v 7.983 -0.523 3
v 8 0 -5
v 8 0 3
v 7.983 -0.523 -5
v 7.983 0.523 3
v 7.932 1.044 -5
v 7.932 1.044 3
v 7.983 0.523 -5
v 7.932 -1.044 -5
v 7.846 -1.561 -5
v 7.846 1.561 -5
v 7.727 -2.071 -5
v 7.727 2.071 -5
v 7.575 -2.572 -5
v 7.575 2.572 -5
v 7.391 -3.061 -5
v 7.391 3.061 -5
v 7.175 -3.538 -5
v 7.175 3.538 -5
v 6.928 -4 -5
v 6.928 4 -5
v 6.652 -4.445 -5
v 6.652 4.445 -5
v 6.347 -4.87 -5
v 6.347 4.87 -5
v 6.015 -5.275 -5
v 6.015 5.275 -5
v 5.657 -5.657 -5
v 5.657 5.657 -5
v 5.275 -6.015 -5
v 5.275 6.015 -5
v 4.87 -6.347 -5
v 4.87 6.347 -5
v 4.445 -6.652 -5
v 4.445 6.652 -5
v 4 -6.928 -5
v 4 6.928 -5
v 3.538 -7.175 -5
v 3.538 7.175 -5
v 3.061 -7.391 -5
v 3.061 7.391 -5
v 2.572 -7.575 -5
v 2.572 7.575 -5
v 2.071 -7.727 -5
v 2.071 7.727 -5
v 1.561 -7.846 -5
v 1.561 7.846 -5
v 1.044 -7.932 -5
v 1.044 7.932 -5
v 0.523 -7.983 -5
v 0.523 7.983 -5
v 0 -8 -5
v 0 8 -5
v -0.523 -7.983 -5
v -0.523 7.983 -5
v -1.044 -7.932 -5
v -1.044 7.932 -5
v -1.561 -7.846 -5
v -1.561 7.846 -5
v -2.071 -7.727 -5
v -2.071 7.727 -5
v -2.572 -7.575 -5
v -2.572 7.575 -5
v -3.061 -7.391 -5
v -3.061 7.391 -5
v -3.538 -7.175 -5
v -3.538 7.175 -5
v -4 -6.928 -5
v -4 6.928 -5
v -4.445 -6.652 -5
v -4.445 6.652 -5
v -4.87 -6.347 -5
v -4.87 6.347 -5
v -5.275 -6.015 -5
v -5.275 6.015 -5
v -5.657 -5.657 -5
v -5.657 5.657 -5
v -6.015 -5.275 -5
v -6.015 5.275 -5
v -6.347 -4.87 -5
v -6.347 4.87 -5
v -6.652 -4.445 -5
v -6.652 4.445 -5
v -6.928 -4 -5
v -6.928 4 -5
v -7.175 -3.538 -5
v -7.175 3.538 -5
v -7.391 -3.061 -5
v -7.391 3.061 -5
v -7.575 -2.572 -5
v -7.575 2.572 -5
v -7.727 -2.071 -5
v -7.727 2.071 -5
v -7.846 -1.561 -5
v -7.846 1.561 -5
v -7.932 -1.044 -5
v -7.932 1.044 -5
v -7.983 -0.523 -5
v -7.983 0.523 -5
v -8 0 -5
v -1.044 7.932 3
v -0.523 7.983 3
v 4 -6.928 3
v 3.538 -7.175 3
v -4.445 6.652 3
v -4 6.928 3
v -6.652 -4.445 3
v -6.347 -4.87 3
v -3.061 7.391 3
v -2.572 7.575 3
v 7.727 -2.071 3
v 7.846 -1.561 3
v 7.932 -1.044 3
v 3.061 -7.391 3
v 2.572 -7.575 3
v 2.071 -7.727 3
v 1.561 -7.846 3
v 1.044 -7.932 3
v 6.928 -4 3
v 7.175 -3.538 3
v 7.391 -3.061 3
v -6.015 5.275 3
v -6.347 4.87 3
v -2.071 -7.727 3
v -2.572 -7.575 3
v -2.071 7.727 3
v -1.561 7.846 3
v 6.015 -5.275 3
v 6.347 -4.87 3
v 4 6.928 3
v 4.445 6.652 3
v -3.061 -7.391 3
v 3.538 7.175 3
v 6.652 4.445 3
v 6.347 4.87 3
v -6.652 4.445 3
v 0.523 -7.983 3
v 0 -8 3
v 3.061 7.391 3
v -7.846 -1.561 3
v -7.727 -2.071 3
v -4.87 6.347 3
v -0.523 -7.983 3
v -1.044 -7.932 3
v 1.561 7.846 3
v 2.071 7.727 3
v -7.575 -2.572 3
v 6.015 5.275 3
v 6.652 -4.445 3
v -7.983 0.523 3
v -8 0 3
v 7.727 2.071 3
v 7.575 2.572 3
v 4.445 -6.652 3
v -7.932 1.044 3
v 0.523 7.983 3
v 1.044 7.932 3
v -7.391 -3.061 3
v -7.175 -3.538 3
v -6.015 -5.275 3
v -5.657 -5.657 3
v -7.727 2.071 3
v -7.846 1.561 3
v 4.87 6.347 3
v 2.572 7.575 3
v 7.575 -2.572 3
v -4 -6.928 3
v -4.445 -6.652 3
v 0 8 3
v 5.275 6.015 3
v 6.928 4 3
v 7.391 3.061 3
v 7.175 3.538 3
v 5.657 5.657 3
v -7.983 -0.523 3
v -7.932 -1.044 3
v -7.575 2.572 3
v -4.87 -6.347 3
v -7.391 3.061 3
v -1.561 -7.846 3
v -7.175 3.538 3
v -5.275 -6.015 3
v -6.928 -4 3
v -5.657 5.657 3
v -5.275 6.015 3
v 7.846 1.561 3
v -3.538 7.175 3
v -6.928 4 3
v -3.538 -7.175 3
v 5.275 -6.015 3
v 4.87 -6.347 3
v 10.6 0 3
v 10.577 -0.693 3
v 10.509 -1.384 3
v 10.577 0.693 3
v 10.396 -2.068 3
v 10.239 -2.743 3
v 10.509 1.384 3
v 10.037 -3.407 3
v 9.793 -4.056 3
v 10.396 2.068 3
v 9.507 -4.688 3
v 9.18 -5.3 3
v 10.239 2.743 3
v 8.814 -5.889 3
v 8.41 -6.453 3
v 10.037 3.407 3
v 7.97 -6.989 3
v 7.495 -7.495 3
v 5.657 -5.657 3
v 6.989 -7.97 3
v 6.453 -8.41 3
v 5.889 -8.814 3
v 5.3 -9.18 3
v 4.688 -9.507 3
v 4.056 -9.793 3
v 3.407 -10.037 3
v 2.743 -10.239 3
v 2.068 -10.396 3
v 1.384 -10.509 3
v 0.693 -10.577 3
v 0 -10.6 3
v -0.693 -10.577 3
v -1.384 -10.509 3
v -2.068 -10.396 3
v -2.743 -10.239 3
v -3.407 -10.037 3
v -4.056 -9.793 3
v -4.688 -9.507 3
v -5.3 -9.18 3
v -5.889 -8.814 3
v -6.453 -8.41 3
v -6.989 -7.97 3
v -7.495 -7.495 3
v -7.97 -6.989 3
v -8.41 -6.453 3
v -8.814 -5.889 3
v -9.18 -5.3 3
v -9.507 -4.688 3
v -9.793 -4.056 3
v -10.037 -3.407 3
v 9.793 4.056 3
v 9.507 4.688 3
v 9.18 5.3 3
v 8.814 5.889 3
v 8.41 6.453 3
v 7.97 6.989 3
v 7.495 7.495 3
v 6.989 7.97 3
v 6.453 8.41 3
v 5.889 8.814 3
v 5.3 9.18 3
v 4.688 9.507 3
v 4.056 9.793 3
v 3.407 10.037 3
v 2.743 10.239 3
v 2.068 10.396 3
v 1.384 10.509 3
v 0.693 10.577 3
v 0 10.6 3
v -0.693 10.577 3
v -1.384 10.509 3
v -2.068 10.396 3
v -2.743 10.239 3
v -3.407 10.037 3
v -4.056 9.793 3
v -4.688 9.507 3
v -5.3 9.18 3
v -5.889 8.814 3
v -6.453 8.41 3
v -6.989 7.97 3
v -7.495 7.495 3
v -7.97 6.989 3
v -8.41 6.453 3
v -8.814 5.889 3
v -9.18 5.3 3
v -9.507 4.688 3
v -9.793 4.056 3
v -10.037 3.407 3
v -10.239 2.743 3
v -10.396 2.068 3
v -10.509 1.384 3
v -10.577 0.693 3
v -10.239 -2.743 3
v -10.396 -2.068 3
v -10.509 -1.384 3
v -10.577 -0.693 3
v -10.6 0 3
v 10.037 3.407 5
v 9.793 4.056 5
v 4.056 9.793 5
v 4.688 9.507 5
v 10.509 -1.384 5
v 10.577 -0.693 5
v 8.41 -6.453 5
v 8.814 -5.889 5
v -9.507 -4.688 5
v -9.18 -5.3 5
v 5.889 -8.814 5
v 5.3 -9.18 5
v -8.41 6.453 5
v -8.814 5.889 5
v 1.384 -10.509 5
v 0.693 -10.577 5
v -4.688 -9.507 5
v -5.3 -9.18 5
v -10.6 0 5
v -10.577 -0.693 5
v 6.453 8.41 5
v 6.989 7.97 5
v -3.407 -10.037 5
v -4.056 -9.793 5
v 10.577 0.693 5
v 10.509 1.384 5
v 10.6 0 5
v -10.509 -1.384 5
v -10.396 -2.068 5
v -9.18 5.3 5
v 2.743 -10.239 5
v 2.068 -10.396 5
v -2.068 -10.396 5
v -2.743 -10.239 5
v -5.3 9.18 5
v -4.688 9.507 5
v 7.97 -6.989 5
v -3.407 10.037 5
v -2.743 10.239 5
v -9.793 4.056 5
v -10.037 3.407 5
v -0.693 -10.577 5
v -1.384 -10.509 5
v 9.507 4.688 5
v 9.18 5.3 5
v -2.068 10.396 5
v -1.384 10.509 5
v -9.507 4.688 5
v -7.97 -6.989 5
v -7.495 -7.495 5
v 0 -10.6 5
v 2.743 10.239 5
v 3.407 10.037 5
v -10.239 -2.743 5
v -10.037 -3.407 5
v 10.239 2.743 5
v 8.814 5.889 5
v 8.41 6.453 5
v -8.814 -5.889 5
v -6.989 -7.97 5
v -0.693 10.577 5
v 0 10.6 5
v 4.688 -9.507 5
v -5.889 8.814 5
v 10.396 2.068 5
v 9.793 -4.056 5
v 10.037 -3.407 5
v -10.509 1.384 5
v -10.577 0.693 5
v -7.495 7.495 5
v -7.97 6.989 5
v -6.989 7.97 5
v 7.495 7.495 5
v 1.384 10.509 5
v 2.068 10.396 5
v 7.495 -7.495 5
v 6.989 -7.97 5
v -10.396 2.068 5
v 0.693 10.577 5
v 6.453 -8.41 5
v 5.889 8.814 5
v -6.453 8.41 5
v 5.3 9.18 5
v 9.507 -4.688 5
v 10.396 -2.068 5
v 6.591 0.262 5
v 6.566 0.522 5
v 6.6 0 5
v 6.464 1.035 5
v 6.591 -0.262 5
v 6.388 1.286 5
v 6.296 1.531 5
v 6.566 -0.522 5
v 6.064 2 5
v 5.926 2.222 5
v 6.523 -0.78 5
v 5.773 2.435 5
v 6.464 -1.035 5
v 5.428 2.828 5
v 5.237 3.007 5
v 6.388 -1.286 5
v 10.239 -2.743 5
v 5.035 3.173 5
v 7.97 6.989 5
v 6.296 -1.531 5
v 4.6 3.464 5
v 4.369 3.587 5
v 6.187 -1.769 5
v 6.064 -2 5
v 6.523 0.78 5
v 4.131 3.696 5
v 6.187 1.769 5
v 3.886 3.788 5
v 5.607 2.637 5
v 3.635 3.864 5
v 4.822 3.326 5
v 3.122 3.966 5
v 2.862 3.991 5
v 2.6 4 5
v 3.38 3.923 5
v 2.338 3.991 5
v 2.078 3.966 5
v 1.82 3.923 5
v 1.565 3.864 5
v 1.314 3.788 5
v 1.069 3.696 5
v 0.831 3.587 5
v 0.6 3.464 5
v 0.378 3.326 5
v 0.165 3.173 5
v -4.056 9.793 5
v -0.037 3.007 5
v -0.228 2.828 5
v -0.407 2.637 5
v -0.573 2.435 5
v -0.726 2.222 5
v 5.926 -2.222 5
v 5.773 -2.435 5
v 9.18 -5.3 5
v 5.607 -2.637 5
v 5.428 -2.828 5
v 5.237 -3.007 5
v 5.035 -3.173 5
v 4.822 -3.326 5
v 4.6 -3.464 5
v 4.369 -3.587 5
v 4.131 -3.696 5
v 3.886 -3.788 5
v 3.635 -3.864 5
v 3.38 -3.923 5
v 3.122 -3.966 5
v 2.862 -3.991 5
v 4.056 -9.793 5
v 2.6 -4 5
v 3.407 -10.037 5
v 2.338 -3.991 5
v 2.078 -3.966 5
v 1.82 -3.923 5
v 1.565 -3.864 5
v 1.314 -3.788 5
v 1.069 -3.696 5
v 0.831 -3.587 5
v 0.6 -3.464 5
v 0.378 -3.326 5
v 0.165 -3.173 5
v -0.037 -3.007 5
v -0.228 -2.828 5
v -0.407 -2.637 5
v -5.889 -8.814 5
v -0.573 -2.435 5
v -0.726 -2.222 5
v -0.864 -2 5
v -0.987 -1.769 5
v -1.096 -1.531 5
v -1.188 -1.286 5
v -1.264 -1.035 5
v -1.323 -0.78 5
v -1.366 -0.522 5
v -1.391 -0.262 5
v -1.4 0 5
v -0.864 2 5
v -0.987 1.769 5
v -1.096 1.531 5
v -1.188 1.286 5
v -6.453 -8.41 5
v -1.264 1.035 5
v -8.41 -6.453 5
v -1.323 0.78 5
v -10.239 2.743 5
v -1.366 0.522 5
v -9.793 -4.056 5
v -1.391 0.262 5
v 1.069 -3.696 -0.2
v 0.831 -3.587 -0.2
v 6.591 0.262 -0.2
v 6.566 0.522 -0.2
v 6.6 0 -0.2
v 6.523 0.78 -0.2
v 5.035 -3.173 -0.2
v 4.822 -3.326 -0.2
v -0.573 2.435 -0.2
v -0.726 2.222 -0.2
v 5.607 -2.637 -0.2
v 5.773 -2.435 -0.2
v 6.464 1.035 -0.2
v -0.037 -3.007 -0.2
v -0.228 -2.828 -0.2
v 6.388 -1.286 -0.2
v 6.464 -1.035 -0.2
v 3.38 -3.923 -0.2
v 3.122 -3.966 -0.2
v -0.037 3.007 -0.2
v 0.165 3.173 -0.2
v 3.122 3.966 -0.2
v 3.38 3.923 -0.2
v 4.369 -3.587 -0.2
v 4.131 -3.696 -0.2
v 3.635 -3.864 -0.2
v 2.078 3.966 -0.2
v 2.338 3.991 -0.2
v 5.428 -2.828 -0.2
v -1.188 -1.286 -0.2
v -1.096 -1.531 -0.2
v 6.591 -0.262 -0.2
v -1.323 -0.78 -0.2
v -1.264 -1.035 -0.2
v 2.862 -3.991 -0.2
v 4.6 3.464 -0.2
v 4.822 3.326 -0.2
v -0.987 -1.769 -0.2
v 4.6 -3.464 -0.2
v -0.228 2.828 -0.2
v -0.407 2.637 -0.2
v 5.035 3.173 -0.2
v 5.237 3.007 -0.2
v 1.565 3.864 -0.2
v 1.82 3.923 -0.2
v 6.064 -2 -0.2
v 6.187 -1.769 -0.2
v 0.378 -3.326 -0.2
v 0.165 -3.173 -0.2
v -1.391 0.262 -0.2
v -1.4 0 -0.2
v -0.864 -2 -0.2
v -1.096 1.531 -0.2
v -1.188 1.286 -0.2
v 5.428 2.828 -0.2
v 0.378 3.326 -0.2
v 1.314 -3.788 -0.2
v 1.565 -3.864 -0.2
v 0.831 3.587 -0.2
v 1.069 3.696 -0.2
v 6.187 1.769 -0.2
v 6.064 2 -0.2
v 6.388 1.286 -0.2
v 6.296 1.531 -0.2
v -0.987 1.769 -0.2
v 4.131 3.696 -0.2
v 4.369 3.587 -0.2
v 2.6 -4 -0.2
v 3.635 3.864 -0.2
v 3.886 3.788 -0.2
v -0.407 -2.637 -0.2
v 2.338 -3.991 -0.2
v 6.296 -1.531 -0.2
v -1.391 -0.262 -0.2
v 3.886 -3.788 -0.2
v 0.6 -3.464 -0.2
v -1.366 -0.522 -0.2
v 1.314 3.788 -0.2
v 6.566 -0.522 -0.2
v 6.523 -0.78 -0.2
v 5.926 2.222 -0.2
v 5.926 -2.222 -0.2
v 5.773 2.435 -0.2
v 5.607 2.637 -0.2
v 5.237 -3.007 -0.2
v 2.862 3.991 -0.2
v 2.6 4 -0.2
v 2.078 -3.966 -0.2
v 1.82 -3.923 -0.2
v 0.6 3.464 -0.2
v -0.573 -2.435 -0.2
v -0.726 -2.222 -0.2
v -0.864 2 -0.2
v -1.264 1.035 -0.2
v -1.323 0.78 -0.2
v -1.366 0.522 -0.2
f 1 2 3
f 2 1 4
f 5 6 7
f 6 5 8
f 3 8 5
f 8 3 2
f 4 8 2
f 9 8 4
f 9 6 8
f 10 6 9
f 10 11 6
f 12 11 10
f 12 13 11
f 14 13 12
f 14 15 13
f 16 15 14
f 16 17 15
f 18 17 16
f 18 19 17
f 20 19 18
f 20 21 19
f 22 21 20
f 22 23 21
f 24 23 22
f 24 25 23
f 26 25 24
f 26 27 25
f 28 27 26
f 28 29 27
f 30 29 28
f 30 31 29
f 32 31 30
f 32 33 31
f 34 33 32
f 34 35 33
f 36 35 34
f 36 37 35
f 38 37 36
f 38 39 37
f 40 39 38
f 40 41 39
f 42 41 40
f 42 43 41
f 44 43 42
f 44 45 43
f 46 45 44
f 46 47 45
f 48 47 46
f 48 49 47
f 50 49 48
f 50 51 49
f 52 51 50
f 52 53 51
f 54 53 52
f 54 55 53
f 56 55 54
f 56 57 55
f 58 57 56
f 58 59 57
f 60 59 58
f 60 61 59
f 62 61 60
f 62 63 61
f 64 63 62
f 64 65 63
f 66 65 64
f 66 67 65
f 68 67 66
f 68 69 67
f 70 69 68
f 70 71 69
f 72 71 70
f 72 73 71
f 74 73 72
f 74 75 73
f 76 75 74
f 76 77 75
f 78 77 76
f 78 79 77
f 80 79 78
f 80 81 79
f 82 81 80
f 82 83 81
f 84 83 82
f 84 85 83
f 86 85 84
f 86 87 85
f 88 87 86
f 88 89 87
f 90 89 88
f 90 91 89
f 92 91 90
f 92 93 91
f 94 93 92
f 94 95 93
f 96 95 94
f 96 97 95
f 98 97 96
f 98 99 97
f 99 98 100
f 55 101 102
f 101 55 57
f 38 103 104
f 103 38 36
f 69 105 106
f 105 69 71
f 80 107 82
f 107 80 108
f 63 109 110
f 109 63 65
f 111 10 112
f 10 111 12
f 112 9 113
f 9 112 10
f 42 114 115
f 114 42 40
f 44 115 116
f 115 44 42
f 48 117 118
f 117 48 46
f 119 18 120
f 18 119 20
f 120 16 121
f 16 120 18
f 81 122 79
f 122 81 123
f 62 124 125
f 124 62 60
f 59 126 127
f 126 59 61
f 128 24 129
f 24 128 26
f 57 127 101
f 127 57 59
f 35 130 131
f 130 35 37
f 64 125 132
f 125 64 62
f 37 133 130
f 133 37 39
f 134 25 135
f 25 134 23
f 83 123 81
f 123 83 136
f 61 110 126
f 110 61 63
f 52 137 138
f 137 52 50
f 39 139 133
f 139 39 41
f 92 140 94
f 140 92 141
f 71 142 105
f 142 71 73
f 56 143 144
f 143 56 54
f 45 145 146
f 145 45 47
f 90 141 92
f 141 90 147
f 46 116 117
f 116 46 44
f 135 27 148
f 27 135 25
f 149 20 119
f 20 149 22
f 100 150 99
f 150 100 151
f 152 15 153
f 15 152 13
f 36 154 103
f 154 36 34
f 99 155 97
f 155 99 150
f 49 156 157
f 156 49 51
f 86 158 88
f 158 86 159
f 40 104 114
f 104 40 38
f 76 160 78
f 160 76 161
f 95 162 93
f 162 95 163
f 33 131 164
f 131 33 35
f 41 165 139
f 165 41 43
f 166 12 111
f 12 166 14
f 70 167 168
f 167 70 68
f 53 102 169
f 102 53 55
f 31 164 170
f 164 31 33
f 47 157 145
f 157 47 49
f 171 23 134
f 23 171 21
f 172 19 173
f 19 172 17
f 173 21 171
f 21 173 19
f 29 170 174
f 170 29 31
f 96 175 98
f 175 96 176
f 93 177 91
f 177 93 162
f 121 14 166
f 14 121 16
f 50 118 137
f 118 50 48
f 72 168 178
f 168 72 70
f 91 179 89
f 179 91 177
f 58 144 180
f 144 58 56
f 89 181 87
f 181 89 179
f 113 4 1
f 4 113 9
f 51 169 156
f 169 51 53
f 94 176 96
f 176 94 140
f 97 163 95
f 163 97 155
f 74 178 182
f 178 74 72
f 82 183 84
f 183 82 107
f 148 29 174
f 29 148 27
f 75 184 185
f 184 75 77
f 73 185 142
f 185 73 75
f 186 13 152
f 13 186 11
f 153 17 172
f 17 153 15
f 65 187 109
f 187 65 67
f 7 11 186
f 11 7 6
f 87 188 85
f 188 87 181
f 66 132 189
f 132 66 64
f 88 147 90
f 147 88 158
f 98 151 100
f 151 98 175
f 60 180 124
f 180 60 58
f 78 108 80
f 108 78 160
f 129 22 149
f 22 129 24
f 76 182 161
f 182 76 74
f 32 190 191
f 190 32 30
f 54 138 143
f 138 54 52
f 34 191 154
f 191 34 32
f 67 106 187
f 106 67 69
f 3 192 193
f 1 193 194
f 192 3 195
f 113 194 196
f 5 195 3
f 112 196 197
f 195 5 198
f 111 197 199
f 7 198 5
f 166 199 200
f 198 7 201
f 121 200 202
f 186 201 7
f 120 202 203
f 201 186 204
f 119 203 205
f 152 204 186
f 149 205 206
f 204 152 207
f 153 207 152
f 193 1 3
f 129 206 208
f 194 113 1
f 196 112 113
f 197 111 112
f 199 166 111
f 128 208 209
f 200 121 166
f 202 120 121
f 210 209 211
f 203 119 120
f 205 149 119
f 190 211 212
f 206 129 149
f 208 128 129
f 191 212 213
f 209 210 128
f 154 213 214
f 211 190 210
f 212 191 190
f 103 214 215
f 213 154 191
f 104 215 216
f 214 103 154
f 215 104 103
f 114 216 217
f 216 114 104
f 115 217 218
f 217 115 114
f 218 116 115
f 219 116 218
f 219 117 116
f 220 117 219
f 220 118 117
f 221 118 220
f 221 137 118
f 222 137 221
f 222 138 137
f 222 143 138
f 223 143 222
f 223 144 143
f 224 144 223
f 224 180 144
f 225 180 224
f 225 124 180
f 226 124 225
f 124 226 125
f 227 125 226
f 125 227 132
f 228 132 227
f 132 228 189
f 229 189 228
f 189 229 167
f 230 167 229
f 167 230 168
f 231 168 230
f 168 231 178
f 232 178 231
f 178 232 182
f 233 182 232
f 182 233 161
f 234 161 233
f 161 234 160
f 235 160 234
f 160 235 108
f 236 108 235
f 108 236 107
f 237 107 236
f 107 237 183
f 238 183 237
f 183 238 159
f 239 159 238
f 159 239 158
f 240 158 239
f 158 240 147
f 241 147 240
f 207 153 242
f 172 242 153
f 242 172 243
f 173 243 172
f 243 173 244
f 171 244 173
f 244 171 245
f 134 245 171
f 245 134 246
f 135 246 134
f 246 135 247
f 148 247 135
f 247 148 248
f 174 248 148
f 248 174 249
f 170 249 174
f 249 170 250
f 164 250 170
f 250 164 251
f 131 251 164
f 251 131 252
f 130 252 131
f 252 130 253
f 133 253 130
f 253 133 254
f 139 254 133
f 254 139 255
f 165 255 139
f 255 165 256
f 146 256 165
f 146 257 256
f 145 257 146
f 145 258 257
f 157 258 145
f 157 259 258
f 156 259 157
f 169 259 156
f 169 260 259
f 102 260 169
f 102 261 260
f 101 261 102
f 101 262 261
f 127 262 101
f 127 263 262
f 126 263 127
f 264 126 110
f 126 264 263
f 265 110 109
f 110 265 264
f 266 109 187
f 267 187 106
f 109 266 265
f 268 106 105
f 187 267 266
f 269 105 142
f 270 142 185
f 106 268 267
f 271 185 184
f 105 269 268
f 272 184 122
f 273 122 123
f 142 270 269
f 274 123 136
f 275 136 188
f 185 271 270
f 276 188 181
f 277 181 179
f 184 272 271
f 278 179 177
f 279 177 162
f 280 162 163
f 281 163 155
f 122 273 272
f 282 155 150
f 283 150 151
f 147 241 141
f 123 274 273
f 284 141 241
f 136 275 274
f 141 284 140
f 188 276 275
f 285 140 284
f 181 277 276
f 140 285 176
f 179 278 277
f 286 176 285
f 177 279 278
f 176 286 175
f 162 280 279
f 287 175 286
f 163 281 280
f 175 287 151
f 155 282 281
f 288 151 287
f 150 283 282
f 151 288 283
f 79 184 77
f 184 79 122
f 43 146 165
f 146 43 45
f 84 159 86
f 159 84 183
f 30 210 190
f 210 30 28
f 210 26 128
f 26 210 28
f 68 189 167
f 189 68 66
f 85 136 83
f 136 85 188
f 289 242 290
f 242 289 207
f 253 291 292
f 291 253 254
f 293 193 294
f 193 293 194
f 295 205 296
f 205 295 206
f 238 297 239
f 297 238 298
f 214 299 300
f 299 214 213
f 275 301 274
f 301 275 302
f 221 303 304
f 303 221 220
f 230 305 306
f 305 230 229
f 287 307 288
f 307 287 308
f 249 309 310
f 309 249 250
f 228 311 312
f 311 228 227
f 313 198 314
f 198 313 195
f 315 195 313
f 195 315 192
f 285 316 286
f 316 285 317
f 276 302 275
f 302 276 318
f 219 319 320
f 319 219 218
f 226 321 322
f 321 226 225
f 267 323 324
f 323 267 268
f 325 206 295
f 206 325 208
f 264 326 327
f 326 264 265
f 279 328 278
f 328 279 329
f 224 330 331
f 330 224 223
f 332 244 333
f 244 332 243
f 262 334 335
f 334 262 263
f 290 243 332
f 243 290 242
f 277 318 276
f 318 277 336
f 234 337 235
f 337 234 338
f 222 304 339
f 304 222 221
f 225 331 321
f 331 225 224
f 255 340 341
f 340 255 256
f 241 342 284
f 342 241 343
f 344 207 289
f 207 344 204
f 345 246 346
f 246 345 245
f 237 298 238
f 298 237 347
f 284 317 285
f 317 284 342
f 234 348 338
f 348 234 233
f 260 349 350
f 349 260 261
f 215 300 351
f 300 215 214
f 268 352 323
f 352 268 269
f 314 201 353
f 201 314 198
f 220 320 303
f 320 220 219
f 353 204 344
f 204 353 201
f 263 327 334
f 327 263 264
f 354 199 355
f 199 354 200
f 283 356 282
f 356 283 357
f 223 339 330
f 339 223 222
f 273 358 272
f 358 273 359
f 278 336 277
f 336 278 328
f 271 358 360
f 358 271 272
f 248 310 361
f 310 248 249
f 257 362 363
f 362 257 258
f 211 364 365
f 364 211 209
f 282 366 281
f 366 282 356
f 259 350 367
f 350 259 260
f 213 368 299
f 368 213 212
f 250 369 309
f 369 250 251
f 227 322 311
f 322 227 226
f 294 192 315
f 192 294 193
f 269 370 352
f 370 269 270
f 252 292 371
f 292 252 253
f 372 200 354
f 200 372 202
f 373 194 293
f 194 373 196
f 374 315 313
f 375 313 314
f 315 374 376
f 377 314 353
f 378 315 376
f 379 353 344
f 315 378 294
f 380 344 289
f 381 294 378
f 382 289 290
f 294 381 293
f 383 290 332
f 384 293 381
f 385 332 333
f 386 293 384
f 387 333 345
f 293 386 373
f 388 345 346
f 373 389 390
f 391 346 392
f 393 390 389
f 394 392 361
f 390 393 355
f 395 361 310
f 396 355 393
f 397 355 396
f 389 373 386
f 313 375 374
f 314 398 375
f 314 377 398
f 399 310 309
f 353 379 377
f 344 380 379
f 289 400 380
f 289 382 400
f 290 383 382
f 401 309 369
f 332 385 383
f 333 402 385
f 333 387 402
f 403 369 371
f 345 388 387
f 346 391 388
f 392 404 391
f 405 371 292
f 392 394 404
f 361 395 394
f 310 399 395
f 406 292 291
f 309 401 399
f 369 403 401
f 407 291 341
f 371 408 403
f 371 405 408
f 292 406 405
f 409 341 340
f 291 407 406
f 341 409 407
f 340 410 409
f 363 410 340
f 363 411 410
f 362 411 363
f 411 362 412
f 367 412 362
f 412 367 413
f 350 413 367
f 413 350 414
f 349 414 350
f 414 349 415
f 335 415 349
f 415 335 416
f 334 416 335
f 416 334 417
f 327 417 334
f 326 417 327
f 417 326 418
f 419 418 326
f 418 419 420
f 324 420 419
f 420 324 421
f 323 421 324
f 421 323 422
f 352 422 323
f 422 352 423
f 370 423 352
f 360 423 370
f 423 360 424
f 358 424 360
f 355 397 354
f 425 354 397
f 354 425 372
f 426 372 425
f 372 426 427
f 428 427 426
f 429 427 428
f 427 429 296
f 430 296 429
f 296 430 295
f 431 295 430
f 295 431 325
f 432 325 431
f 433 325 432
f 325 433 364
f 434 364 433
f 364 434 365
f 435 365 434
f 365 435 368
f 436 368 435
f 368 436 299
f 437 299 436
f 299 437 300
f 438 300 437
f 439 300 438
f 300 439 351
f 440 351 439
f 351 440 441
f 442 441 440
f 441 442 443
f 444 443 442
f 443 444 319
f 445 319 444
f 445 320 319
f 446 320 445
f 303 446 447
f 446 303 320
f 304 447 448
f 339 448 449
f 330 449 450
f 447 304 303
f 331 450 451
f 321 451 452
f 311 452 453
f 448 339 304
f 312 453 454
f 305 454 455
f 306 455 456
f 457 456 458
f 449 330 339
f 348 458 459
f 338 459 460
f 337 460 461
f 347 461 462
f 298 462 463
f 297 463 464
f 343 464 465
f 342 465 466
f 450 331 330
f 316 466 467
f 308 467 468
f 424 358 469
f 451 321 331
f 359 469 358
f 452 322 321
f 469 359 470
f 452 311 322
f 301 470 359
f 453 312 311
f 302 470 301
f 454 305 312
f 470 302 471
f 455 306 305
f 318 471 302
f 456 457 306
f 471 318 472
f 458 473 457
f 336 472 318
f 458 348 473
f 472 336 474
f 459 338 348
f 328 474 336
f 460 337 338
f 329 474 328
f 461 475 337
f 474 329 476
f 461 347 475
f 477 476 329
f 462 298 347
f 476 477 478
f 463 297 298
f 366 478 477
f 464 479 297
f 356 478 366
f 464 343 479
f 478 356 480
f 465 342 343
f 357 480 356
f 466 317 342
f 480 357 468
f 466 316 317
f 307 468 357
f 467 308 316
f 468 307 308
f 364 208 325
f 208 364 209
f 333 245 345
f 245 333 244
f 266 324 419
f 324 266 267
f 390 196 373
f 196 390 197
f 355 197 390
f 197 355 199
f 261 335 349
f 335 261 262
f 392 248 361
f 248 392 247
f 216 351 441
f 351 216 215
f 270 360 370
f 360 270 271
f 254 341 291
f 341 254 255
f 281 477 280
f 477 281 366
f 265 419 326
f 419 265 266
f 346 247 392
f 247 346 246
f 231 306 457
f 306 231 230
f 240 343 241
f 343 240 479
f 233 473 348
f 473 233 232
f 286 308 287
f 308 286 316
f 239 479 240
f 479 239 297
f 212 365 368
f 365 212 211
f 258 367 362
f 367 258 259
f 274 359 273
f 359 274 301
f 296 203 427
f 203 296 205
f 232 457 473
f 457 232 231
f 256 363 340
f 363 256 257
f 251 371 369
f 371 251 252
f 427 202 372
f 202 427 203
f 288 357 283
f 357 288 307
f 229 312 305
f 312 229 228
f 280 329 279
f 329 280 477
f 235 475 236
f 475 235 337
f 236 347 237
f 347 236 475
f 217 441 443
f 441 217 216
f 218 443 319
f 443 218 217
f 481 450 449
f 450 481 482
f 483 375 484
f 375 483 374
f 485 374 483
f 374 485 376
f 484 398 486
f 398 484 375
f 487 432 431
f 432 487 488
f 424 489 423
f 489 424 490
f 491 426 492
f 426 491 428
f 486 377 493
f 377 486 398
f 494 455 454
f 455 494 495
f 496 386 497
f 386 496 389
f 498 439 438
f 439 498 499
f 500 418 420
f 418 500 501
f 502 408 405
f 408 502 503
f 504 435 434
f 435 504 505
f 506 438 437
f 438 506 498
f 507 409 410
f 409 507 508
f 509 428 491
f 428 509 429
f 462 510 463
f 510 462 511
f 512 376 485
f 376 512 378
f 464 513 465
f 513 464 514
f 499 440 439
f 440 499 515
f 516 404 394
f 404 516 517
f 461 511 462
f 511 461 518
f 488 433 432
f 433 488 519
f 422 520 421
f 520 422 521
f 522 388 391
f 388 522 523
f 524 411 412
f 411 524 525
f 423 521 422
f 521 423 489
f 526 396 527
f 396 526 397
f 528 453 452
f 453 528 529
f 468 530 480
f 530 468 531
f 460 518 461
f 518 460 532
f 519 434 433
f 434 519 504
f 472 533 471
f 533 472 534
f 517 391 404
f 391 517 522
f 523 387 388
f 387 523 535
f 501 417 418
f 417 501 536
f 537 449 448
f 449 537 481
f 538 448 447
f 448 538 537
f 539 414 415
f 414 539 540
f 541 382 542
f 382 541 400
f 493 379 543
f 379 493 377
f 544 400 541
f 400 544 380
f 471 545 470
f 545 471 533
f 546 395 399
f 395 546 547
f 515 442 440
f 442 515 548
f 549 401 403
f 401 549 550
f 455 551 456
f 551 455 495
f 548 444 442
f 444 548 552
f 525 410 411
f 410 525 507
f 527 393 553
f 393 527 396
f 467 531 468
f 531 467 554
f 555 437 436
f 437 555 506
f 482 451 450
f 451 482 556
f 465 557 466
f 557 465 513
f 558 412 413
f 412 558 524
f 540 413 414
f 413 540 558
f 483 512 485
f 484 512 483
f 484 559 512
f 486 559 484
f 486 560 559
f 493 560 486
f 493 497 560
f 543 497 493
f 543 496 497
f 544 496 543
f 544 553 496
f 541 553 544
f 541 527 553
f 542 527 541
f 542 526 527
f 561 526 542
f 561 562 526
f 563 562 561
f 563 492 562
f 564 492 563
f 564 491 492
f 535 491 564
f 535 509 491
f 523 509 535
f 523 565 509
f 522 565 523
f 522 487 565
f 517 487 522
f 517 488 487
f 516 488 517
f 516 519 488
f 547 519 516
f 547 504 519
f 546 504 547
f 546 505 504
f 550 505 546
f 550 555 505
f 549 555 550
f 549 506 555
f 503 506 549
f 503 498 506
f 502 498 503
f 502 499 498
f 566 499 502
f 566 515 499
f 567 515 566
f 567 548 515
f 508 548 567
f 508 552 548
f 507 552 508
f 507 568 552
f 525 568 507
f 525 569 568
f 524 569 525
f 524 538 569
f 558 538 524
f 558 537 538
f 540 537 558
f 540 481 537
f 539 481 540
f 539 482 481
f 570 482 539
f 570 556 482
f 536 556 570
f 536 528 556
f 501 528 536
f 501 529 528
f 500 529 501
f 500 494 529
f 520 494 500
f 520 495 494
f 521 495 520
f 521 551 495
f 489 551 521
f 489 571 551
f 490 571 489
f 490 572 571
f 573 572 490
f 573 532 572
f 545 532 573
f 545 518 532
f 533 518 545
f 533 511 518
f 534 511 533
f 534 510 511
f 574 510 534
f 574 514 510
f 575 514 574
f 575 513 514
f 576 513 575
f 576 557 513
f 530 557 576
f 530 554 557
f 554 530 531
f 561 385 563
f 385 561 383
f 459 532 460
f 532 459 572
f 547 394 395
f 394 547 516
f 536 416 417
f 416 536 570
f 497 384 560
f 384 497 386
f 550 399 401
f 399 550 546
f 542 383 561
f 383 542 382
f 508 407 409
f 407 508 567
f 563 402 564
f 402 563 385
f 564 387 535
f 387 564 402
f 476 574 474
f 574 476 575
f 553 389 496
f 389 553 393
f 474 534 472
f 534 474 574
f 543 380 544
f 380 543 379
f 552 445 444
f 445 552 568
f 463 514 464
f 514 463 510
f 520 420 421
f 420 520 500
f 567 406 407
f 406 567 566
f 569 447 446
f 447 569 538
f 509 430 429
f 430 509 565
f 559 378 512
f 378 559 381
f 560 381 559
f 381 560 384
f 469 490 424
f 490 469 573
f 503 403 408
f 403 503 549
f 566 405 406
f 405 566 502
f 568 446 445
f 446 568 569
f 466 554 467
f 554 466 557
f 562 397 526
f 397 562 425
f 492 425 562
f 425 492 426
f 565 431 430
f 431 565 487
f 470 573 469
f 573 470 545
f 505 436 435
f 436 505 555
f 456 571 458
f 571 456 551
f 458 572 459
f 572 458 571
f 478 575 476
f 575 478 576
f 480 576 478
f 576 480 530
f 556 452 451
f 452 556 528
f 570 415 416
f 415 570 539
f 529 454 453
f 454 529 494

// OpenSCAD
$fn=96;

od_body = 16.0;
od_flange = 21.2;
h_total = 10.0;
t_flange = 2.0;
h_body = h_total - t_flange;

id_bore = 8.0;
ecc = 2.6;

module bushing_body() {
    union() {
        translate([0,0,0]) cylinder(h=h_body, d=od_body, center=false);
        translate([0,0,h_body]) cylinder(h=t_flange, d=od_flange, center=false);
    }
}

module eccentric_bore() {
    translate([ecc,0,h_total/2]) cylinder(h=h_total+0.4, d=id_bore, center=true);
}

difference() {
    translate([0,0,-h_total/2]) bushing_body();
    eccentric_bore();
}
